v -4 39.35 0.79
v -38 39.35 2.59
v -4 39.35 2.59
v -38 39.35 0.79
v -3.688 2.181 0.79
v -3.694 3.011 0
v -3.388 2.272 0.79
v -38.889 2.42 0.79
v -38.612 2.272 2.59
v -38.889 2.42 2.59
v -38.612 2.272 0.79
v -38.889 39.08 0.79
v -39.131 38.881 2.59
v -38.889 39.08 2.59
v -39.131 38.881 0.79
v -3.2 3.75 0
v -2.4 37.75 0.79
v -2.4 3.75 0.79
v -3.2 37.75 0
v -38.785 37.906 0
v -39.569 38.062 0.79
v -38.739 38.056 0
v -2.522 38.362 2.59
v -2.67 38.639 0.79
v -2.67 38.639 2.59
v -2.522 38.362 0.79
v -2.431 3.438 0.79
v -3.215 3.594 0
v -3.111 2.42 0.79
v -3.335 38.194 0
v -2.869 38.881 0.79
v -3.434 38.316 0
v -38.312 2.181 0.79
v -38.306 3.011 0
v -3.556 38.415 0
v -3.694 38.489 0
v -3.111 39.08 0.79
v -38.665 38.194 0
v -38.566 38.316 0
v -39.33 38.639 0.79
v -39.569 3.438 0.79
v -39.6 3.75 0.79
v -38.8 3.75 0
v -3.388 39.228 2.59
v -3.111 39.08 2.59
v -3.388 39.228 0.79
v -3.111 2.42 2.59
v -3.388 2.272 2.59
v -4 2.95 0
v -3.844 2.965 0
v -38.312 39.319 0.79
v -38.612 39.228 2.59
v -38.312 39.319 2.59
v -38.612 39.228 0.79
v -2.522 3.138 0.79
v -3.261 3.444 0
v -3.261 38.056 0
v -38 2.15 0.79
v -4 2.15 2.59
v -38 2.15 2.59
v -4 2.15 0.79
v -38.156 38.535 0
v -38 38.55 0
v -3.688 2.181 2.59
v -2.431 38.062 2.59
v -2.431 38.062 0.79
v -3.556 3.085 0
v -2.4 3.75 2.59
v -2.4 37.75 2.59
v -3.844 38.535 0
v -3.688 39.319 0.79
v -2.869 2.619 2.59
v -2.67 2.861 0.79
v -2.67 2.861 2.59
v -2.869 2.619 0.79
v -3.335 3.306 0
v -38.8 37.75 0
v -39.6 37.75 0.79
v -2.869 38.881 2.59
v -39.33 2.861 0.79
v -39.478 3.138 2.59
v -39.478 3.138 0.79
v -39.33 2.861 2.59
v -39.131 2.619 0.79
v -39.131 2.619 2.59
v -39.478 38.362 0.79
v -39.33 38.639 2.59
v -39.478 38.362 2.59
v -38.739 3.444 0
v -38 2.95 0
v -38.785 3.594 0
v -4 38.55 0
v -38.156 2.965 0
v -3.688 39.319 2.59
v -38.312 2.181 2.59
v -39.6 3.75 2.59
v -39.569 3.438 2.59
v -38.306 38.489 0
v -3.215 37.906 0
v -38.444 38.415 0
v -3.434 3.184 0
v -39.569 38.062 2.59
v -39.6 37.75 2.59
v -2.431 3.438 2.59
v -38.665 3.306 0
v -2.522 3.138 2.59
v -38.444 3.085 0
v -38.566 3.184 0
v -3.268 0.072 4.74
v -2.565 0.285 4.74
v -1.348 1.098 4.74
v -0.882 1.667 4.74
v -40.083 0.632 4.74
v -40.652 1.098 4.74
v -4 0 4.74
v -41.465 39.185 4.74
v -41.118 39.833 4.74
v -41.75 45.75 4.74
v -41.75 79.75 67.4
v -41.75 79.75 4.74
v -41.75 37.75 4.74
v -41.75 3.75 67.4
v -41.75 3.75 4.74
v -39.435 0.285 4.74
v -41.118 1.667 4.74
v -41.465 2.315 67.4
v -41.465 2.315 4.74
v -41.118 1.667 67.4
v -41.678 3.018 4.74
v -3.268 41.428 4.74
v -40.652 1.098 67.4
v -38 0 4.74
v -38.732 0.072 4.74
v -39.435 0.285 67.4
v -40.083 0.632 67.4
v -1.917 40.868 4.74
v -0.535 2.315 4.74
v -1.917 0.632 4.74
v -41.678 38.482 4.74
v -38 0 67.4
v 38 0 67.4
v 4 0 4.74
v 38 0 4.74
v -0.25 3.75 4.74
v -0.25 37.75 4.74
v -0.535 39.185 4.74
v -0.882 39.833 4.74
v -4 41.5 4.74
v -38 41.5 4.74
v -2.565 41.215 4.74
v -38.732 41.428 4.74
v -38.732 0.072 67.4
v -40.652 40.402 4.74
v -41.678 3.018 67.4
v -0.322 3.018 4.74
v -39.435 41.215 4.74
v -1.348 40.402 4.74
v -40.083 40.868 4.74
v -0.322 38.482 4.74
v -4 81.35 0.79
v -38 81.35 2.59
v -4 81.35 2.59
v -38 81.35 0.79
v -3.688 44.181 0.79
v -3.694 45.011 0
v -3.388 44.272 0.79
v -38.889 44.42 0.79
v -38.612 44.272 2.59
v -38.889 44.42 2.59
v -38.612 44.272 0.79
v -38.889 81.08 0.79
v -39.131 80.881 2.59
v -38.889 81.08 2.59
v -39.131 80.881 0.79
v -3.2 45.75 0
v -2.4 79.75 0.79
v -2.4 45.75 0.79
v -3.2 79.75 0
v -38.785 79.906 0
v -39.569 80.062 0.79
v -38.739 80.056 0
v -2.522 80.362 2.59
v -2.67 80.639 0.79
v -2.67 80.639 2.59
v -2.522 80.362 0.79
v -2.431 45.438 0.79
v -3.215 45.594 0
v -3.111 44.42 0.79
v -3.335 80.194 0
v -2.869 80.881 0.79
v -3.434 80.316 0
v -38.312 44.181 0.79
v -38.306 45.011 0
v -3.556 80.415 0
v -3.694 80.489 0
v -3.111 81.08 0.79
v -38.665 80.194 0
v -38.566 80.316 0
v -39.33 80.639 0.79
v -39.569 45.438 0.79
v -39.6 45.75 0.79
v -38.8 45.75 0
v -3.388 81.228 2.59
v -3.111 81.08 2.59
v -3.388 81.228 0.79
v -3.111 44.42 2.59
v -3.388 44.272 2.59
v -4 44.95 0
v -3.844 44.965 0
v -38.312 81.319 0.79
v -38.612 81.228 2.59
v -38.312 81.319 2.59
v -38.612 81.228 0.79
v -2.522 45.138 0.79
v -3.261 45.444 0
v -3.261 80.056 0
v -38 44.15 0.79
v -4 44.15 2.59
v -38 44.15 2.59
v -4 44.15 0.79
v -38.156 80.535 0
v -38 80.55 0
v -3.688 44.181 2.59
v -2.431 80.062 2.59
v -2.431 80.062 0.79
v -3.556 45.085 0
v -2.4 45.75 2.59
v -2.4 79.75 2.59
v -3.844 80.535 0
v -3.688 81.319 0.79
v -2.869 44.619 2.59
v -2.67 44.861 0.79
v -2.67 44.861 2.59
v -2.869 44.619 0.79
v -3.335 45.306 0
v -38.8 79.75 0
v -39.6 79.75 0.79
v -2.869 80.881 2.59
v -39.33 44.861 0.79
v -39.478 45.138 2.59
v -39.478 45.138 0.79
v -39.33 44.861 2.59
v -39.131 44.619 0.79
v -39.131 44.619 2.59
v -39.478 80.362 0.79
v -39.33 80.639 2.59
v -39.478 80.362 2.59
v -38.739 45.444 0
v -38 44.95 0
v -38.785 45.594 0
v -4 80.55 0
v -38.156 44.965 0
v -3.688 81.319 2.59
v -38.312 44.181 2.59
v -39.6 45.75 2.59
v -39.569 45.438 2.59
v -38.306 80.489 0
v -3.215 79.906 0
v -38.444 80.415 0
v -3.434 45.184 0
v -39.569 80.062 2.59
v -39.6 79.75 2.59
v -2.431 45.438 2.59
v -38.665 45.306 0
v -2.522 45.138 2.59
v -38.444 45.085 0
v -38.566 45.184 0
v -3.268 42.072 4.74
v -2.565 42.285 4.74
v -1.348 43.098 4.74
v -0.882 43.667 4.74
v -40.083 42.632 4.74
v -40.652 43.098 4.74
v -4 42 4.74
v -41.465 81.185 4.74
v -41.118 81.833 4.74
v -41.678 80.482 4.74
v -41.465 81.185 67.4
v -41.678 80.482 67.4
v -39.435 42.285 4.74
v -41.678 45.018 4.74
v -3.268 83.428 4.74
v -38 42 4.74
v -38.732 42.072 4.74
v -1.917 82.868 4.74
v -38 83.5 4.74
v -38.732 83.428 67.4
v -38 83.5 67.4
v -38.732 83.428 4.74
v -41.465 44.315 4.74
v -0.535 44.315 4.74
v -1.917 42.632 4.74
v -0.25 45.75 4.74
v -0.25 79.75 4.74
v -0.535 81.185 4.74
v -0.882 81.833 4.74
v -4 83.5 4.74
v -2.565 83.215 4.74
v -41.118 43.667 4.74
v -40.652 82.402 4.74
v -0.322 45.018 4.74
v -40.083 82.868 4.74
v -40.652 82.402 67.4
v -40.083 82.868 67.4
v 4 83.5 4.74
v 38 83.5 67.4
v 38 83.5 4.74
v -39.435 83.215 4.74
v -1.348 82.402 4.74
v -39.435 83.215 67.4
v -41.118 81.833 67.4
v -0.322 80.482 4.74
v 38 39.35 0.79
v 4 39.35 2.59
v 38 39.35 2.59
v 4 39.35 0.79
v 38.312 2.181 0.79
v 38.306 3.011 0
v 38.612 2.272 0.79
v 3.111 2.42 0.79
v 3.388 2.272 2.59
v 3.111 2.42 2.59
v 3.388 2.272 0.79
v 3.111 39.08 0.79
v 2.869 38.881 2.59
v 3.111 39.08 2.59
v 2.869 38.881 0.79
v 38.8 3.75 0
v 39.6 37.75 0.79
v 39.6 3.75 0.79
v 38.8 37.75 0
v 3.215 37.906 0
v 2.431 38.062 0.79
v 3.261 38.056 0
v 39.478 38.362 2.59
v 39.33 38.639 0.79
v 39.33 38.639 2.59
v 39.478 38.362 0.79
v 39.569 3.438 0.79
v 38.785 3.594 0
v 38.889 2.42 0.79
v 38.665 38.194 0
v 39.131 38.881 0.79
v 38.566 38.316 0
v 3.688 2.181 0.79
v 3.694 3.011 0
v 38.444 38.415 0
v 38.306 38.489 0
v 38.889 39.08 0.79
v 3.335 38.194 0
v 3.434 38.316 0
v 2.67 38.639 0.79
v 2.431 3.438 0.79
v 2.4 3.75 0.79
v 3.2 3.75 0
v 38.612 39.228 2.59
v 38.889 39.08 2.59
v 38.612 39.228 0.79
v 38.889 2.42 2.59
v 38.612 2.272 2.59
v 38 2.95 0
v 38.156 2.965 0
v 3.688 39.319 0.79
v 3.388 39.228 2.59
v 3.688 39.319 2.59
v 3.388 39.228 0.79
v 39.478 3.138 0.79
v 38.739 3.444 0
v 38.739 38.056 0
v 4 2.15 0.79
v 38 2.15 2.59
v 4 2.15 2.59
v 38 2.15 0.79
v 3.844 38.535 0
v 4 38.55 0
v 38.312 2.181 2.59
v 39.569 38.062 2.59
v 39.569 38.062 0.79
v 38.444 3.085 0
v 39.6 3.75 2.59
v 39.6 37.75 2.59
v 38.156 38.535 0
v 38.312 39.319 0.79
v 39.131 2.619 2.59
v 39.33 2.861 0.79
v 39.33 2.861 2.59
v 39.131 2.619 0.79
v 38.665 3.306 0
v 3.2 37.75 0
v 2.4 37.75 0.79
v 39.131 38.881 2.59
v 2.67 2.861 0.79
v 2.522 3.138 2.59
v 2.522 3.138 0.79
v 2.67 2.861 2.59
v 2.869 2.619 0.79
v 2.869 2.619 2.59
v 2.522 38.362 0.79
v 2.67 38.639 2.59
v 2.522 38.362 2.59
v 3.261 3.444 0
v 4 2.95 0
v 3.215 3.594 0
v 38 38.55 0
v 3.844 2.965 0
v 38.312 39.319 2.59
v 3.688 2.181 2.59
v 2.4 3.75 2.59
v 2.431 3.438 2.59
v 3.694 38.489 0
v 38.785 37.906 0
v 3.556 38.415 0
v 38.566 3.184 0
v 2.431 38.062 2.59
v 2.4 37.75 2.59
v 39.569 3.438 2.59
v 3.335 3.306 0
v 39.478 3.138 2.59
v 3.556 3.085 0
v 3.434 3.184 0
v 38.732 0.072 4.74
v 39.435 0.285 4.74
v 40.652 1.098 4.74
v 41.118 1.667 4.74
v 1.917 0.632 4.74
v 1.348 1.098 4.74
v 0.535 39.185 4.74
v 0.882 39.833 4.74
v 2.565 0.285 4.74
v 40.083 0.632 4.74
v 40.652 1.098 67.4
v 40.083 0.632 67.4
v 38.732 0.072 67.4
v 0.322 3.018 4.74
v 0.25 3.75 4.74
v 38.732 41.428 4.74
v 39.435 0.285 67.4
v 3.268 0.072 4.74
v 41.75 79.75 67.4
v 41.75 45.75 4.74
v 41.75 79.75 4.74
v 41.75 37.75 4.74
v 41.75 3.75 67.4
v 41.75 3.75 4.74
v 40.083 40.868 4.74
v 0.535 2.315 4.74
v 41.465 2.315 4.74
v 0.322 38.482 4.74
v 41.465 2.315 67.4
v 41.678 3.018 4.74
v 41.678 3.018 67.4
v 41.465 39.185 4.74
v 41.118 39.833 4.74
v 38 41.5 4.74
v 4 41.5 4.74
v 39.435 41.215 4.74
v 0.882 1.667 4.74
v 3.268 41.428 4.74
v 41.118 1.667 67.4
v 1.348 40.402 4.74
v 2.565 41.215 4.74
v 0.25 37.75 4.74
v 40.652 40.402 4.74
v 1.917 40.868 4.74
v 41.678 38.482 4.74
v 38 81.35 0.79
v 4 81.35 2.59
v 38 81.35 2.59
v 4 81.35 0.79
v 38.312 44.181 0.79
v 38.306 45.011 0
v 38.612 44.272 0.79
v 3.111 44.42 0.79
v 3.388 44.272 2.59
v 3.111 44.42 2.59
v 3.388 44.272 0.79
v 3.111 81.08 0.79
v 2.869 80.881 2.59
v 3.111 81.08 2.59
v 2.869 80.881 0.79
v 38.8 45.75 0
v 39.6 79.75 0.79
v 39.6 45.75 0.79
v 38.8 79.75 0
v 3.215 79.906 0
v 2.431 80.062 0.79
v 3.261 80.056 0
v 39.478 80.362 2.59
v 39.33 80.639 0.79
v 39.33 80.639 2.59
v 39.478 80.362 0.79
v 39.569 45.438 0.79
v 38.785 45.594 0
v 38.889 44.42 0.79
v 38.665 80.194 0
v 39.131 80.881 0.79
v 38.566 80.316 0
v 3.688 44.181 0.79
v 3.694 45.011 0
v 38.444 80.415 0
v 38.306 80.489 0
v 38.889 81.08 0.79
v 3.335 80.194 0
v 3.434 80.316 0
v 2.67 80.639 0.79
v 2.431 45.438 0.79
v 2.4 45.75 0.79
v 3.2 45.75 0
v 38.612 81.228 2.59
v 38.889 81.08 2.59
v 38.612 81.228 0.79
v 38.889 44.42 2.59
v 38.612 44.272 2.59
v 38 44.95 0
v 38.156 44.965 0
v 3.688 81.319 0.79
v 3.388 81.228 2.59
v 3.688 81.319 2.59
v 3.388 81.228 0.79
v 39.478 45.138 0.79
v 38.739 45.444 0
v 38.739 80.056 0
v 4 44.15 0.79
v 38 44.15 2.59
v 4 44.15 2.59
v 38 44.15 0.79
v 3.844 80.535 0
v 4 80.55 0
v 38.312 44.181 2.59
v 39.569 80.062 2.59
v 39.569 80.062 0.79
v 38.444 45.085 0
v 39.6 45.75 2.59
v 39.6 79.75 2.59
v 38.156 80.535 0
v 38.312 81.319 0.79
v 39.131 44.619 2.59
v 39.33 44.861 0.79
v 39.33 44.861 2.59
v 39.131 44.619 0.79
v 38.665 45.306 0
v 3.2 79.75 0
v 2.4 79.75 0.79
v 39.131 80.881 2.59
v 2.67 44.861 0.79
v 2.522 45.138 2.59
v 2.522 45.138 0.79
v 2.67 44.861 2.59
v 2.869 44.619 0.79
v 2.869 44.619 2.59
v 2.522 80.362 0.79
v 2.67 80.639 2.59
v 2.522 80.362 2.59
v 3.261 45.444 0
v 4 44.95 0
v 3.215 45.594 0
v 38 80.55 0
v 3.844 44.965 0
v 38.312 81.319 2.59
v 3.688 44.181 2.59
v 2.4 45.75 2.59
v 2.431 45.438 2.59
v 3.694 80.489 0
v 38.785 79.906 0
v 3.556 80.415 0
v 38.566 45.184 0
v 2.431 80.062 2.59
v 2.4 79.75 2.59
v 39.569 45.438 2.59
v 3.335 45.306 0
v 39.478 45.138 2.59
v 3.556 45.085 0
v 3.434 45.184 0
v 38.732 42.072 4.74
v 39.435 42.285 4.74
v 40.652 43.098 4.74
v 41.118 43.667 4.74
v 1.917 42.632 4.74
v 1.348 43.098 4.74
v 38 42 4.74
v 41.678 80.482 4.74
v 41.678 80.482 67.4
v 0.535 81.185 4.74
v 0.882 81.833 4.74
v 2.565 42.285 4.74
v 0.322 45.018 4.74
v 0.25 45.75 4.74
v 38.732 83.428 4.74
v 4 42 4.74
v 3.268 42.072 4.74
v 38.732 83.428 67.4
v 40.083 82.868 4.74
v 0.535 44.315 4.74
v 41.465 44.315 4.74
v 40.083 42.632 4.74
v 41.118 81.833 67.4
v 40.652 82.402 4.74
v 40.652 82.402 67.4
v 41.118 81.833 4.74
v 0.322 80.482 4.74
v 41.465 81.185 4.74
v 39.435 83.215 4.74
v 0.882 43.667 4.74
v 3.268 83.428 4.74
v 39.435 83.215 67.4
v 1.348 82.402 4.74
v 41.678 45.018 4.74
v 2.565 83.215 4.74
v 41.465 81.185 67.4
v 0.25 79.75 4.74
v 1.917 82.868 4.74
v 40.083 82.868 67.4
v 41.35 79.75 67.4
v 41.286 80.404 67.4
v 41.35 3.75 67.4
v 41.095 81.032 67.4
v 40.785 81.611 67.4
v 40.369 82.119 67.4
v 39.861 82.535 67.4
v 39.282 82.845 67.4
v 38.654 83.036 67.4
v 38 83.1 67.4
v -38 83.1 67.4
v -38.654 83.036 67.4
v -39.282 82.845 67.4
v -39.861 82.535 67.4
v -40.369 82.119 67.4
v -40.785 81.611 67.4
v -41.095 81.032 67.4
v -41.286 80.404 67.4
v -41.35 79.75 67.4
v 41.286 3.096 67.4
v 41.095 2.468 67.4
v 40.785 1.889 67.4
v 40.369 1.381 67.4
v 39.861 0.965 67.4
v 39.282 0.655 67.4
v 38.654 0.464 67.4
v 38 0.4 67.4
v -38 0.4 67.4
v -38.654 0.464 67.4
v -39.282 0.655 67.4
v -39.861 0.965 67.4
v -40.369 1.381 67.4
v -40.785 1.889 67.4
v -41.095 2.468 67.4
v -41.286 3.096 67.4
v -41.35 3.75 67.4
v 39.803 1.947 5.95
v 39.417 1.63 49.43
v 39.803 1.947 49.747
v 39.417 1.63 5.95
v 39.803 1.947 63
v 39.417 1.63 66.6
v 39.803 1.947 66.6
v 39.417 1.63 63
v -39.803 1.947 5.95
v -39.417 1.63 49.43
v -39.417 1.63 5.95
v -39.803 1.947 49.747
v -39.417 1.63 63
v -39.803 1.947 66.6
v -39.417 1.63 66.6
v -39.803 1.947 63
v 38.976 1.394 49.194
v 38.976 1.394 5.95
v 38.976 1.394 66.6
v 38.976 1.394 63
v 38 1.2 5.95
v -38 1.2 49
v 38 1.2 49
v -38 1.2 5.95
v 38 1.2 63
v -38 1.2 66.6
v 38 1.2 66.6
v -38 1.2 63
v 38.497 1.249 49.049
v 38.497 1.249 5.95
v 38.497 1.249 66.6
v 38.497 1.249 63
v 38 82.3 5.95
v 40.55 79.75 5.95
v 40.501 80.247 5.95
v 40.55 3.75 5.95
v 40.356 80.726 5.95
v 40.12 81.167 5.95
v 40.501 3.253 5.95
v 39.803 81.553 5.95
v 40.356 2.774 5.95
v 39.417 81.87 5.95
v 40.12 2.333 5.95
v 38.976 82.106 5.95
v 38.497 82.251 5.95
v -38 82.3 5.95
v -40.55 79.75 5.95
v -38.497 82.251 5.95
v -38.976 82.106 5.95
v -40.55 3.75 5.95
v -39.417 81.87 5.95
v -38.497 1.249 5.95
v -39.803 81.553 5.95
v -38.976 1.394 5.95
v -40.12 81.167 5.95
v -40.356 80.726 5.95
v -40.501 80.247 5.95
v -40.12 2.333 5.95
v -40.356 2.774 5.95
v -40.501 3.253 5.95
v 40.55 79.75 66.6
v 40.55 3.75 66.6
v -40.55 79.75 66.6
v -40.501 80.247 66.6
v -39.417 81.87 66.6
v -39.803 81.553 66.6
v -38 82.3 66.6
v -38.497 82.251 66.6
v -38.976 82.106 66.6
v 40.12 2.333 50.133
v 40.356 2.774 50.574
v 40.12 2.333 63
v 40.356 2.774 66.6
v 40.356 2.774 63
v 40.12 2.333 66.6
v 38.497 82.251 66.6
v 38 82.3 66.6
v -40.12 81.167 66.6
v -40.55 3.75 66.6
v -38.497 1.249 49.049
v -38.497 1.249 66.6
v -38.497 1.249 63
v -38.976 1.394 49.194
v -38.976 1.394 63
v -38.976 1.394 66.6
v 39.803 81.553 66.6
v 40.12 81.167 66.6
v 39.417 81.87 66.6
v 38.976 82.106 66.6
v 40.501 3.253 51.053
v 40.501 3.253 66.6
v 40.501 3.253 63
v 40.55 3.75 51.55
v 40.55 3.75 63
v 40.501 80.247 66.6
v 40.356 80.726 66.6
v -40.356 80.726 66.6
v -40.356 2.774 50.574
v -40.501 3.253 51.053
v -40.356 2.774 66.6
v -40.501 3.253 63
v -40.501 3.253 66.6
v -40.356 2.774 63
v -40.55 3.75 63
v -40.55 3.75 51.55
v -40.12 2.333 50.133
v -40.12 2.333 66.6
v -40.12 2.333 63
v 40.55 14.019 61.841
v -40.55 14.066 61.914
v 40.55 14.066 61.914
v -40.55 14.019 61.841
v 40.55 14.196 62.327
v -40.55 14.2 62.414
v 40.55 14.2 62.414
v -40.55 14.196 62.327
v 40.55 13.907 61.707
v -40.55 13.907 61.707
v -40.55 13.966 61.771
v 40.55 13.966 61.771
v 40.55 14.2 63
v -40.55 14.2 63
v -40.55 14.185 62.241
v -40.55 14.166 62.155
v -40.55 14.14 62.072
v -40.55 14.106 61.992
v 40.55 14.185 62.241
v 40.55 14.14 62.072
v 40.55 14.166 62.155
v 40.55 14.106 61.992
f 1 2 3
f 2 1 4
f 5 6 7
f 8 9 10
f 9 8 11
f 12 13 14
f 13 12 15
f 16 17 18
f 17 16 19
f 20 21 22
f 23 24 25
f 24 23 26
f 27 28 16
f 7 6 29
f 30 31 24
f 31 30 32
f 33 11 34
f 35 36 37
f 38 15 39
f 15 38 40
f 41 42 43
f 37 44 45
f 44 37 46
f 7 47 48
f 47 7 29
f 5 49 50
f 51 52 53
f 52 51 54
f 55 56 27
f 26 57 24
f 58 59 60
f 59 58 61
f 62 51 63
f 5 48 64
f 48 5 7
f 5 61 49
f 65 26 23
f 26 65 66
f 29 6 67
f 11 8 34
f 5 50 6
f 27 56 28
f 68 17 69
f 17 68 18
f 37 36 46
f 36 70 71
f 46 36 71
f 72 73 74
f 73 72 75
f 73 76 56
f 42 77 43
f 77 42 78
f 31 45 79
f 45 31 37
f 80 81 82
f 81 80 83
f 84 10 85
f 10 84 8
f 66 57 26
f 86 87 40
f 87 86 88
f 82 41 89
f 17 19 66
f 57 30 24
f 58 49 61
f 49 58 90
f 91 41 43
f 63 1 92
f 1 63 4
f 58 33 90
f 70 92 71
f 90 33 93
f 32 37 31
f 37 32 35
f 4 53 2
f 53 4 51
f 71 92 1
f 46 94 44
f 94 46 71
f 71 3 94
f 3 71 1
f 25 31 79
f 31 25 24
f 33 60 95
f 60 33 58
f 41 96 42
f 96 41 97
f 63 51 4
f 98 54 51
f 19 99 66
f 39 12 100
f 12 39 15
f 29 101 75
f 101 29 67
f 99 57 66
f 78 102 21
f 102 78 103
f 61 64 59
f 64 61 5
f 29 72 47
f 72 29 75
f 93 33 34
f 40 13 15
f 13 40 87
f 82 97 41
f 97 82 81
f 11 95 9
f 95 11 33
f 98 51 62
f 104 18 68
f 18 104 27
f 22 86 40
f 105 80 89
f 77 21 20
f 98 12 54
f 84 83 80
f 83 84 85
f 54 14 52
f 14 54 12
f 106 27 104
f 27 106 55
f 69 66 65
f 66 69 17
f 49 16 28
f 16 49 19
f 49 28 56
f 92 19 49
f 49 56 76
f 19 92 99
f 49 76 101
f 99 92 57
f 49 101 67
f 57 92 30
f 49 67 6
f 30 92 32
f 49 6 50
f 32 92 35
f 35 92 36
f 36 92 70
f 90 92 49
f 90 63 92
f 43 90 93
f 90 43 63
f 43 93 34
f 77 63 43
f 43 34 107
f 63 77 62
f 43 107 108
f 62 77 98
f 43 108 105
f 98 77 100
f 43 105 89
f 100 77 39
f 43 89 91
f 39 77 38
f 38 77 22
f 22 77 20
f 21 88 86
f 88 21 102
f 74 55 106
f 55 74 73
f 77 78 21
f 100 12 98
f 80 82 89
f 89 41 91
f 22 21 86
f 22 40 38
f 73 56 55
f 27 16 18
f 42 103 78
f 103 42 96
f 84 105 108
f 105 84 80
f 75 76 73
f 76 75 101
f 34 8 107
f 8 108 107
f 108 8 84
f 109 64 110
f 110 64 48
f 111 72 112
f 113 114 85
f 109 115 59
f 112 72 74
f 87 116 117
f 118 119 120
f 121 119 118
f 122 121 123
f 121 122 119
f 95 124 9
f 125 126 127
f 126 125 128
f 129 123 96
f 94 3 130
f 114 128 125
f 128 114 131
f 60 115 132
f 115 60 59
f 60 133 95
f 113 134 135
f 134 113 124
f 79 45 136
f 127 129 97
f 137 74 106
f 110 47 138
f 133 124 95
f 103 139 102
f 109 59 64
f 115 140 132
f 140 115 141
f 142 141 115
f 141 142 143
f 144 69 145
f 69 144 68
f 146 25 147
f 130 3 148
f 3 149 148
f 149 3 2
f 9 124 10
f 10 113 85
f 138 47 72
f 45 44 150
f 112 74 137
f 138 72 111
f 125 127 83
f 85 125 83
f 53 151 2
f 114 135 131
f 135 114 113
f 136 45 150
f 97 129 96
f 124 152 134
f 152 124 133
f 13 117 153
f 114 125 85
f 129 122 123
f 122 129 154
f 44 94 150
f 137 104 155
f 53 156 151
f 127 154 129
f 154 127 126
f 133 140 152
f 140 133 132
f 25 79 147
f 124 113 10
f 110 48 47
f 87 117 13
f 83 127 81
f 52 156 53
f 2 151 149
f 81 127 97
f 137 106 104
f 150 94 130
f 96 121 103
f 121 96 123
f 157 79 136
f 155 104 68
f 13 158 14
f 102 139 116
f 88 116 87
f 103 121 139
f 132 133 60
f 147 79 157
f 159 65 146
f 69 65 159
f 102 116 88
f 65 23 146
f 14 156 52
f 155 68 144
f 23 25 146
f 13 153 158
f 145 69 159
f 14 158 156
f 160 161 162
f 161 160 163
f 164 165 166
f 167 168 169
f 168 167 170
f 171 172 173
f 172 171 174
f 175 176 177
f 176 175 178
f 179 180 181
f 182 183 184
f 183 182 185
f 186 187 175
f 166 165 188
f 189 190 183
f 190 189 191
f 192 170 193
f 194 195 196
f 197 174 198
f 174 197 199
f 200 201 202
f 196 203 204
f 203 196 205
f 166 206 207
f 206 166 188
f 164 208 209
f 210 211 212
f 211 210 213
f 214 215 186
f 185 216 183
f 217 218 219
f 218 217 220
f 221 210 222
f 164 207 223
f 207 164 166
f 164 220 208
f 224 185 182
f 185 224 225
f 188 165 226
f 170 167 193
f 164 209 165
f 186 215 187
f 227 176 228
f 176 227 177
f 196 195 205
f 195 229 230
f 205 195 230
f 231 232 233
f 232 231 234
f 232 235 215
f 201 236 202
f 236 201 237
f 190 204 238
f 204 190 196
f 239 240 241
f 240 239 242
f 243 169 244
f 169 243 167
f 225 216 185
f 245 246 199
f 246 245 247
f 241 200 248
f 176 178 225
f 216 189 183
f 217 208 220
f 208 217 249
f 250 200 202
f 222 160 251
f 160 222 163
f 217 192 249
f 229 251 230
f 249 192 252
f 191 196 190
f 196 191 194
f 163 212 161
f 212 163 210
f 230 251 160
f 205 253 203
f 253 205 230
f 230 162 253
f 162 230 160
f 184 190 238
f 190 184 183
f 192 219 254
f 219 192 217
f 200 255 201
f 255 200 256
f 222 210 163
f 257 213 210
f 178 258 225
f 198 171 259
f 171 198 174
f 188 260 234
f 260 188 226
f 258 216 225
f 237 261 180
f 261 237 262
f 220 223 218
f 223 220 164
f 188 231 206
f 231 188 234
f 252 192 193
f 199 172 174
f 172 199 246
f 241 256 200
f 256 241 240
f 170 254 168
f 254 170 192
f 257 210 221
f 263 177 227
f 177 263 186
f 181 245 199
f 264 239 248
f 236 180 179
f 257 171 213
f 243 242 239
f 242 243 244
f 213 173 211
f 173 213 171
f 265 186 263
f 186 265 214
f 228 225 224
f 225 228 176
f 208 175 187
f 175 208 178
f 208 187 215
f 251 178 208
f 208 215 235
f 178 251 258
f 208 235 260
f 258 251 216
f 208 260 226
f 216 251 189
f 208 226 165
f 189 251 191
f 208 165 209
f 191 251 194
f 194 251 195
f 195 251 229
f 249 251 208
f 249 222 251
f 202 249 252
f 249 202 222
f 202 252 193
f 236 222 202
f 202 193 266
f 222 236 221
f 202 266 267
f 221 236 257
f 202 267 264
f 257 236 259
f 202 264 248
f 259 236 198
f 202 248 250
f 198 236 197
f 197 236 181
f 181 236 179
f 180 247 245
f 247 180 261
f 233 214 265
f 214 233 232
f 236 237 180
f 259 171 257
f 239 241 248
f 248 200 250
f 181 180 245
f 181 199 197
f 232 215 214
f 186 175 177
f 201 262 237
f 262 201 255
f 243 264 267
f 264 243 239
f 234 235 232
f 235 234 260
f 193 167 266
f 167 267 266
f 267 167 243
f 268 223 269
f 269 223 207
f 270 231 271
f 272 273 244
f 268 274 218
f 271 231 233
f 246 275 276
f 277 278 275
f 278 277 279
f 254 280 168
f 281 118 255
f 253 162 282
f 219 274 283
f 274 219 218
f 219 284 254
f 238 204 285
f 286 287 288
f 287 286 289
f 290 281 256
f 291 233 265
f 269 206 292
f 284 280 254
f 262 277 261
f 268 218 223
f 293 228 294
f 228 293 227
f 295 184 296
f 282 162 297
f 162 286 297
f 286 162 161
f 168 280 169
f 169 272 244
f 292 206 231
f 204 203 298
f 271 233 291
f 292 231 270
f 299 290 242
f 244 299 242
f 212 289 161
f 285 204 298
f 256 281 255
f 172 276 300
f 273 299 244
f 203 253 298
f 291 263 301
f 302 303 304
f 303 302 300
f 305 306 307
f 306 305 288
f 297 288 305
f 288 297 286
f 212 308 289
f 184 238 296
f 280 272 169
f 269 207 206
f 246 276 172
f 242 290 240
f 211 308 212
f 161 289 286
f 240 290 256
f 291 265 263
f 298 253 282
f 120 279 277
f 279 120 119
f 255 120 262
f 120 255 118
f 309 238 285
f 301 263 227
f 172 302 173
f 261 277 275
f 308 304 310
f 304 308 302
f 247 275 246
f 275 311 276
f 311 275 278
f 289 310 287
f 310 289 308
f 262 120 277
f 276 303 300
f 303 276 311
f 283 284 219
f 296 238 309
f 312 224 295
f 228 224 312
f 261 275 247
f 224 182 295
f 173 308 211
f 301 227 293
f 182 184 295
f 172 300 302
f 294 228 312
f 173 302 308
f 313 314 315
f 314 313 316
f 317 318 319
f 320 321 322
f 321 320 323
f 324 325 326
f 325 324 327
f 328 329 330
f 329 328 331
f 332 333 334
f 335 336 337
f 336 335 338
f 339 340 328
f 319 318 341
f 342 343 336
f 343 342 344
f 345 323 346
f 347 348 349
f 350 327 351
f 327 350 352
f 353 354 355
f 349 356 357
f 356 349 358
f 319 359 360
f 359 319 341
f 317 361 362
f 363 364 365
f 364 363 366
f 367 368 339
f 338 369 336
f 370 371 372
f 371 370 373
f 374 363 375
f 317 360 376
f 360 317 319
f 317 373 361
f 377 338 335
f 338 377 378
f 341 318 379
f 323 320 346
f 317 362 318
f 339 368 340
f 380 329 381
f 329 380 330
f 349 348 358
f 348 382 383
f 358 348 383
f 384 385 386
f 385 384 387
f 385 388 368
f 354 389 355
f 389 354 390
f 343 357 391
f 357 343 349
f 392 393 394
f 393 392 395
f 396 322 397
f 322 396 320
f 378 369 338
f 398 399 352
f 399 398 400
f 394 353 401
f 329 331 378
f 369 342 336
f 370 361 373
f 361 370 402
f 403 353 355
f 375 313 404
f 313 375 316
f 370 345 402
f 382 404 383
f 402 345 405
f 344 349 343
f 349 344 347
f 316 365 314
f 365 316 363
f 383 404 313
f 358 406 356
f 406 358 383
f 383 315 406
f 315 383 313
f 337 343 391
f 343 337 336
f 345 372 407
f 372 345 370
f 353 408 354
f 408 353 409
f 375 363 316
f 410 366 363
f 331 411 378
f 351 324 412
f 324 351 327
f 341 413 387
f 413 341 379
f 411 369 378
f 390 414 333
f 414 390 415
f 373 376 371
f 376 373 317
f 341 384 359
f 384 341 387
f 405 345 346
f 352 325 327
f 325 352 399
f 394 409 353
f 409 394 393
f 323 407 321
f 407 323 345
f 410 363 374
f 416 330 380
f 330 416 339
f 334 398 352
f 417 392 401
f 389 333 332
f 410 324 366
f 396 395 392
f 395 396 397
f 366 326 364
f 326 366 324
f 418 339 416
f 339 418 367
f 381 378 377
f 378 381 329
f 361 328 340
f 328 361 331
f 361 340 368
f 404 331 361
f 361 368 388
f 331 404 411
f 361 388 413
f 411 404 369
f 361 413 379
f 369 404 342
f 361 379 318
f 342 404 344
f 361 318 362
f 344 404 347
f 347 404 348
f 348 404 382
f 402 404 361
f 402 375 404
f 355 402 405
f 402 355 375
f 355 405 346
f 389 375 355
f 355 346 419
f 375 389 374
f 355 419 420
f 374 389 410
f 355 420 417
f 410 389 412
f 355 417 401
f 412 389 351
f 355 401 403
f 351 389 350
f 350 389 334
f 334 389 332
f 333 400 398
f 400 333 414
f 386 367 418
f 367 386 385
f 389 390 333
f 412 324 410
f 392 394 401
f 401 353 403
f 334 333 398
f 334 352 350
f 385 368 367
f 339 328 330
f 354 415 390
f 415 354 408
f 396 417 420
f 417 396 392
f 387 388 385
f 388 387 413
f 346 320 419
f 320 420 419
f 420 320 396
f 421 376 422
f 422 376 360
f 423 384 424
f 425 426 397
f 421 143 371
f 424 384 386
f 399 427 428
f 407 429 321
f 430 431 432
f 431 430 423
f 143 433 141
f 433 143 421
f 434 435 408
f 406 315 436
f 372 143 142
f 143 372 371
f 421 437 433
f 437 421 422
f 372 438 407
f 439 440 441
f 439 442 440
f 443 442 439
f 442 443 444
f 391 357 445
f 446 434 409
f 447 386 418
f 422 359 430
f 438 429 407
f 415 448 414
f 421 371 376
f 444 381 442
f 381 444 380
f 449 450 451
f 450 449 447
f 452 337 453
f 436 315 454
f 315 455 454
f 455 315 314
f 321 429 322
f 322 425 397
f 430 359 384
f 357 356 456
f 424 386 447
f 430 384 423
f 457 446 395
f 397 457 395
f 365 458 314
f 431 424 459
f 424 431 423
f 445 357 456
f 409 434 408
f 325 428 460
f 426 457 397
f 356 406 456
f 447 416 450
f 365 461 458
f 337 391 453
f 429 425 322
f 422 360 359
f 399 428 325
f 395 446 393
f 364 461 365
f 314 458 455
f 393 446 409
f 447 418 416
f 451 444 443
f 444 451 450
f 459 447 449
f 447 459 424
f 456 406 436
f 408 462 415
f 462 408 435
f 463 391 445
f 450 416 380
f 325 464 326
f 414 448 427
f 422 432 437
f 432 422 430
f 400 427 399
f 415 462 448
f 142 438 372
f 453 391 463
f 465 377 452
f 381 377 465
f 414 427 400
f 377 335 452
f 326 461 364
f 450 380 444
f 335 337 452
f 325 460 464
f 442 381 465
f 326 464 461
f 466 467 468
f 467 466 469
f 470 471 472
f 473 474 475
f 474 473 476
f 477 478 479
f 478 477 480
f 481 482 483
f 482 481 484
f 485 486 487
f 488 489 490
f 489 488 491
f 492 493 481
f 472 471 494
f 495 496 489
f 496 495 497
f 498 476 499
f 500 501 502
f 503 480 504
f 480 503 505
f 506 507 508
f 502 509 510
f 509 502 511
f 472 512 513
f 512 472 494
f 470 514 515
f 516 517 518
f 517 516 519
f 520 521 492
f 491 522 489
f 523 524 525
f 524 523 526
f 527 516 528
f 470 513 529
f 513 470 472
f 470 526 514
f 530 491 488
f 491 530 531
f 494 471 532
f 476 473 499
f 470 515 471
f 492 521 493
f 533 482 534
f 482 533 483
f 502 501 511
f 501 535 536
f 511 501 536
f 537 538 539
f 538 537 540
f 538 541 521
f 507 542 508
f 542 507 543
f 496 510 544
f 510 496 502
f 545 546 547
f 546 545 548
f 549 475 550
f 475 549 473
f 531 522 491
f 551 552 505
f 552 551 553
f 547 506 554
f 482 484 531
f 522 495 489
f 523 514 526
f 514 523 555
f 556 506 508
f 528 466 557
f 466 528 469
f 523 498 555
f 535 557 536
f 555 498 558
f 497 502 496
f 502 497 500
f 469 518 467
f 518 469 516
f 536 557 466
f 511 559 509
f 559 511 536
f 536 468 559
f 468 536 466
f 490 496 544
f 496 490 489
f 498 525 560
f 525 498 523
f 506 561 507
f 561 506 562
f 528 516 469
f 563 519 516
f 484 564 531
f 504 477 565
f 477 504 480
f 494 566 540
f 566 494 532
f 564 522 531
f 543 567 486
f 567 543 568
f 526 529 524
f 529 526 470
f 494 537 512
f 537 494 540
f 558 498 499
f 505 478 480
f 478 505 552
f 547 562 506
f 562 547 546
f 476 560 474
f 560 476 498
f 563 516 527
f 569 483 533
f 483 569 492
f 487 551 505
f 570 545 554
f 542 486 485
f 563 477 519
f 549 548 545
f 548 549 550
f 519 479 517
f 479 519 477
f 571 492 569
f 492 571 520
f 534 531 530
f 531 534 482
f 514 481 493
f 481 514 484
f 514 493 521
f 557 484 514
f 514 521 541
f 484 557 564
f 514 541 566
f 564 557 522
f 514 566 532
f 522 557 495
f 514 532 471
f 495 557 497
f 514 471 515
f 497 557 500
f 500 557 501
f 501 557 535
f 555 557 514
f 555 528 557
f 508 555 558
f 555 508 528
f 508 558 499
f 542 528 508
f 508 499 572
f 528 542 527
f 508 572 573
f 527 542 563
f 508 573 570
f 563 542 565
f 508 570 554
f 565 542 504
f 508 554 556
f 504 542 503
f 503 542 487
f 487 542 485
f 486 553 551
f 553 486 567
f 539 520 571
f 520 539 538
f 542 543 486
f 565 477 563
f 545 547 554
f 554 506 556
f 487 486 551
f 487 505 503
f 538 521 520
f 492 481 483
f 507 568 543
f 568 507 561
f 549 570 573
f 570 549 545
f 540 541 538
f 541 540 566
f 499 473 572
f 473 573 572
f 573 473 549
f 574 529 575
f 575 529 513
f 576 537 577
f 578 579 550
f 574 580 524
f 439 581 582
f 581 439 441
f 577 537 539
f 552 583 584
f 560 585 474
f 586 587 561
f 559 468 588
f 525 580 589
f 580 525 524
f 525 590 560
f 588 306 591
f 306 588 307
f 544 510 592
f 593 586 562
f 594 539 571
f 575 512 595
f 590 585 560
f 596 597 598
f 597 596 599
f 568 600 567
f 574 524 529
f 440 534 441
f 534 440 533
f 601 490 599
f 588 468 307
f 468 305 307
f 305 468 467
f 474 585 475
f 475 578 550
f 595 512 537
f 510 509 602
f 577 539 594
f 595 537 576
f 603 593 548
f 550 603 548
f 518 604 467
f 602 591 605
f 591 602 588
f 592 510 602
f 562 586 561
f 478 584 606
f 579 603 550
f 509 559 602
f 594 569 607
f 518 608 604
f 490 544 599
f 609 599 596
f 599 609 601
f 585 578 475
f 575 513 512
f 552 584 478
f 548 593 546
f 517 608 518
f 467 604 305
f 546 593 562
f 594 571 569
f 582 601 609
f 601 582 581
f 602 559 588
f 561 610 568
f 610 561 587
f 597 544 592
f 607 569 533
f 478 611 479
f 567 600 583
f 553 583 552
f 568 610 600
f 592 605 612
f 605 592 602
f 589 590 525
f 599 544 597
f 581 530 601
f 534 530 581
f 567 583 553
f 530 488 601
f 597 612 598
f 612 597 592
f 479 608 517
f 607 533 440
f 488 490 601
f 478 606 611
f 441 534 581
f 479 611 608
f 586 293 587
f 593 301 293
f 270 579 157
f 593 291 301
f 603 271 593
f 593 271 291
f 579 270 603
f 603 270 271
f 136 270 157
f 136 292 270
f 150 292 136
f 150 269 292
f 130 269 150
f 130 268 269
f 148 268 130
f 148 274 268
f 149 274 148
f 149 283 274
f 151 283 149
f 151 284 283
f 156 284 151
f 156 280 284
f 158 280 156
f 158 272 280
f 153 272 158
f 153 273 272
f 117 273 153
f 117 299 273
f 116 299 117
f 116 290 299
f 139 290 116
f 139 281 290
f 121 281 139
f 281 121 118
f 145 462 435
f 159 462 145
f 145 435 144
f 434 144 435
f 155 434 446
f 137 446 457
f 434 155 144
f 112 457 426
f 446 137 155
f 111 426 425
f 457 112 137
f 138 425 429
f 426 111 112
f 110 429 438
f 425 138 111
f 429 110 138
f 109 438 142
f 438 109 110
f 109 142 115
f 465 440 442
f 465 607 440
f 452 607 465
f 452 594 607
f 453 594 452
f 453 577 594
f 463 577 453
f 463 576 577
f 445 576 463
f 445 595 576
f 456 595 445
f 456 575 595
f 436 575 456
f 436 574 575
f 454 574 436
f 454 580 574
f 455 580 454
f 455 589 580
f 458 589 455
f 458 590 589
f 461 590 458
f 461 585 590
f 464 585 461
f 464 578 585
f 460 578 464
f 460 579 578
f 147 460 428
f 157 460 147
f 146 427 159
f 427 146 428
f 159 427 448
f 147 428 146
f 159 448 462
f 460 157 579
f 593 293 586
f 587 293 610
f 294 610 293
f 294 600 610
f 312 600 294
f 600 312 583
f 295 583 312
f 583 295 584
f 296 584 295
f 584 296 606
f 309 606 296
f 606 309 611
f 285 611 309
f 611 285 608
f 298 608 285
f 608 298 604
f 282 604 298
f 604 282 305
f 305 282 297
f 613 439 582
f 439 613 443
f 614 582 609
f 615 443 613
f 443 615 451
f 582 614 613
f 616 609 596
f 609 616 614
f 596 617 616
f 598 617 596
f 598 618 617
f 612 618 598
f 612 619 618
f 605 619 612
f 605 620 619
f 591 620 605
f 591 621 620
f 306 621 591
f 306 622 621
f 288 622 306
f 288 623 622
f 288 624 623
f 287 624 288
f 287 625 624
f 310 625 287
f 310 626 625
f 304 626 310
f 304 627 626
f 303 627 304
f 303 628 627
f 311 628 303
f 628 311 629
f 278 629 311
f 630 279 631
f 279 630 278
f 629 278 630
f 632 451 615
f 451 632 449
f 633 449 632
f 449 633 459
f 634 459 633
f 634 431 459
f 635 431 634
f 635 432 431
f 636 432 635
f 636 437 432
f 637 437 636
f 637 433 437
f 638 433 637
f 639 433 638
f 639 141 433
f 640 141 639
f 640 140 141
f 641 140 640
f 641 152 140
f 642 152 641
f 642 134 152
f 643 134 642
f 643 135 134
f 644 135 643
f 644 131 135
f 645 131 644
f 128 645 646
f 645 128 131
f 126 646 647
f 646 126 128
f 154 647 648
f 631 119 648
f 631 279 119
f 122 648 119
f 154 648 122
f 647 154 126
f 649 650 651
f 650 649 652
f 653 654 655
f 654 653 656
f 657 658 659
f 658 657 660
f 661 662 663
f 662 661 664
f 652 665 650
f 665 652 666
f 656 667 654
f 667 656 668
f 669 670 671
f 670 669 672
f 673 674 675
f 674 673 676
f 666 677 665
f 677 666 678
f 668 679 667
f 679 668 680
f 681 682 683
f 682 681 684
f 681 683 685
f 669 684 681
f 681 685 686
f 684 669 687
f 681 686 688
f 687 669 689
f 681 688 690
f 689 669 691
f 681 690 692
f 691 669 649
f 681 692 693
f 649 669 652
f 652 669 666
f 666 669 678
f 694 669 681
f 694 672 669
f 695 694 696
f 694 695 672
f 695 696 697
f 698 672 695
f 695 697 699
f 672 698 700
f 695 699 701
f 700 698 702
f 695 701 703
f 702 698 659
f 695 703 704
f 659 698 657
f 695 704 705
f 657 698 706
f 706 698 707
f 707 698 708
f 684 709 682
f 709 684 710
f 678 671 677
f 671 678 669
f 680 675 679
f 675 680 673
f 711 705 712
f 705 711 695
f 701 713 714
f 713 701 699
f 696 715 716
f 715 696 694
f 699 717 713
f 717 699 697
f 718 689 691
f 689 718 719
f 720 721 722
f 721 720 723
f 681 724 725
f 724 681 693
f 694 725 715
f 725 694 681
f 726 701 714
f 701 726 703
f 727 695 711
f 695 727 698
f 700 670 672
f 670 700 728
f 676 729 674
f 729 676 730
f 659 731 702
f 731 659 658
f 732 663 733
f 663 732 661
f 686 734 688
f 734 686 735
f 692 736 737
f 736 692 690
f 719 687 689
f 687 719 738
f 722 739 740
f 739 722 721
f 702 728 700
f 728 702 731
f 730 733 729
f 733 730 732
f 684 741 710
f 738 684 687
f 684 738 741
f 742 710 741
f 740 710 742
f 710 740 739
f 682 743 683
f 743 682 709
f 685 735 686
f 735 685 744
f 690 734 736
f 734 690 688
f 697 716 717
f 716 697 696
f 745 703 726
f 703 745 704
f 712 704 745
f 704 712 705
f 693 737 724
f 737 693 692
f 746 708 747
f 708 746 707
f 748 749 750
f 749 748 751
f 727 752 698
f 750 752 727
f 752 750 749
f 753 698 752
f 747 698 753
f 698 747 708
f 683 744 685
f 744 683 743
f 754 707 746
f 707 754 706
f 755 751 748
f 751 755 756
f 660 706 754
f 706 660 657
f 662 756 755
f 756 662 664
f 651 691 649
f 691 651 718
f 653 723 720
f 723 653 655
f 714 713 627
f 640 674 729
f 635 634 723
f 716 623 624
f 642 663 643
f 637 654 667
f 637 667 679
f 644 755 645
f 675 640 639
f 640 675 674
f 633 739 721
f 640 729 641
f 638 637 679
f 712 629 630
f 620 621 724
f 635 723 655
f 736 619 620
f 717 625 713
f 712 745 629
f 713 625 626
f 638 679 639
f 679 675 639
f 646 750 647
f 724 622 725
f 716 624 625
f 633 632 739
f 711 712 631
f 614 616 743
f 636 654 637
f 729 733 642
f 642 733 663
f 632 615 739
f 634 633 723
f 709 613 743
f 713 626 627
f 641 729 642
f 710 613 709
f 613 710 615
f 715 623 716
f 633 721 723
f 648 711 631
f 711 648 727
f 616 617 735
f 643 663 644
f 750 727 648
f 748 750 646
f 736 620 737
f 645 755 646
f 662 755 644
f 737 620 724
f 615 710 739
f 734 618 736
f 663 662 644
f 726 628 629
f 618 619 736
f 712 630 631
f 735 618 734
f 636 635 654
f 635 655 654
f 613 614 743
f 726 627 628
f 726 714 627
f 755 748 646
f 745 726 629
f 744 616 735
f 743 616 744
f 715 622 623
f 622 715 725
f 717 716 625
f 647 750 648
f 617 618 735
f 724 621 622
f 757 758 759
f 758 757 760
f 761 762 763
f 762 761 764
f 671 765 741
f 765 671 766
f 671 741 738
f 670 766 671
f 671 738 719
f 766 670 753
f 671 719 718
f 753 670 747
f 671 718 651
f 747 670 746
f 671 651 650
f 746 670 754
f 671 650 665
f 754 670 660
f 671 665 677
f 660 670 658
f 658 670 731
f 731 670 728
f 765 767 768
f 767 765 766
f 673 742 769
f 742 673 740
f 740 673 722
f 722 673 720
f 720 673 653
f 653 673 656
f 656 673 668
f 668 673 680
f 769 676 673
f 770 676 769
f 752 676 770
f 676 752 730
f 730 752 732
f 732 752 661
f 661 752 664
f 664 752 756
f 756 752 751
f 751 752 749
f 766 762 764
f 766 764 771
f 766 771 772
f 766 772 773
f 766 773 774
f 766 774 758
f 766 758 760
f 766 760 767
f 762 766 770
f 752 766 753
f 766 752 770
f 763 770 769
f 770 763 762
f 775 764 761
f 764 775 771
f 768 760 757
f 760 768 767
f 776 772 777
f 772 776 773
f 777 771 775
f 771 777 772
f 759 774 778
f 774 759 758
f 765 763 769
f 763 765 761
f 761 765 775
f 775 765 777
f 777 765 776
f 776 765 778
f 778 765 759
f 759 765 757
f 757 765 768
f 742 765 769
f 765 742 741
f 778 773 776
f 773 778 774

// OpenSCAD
// file: ../../../modules/gridfinity.scad
// Gridfinity ベースプレートの共有 module。
// 寸法は Gridfinity 仕様 (Zack Freedman) の baseplate 輪郭に従う:
//   ピッチ 42、ソケット上端開口 41.5 (角 R4)、上から 45° 面取り 2.15 →
//   垂直 1.8 (37.2 角・R1.85) → 45° 面取り 0.7 → 底 35.8 角 (R1.15)。
//   ソケット深さ = 2.15 + 1.8 + 0.7 = 4.65。
//
// 座標系: X が列方向 (中央が 0)、Y が行方向 (板の前端が 0)、Z=0 が板の底面。
// 板の外形は grid とは独立に rim で与えるので、grid より大きい板 (縁付き) を
// 作れる。ソケットは rim=[left, right, front, back] の内側へ 42 ピッチで並ぶ。

gf_pitch = 42;
gf_socket_top = 41.5; // 上端開口
gf_socket_mid = 37.2; // 垂直部
gf_socket_bot = 35.8; // 底
gf_socket_r_top = 4;
gf_socket_r_mid = 1.85;
gf_socket_r_bot = 1.15;
gf_chamfer_top = 2.15;
gf_wall_h = 1.8;
gf_chamfer_bot = 0.7;
gf_socket_depth = gf_chamfer_top + gf_wall_h + gf_chamfer_bot; // 4.65
gf_fn = 32;
gf_eps = 0.01; // hull 用の薄板の厚さ
gf_over = 0.5; // 切削の抜き代

// 角丸正方形または矩形 (w は一辺、または [幅, 奥行き]、角 R)
module
gf_rounded_square(w, r)
{
    offset(r = r, $fn = gf_fn)
        square(is_list(w) ? w - [ 2 * r, 2 * r ] : w - 2 * r, center = true);
}

// 厚さ gf_eps の角丸正方形の薄板を z に置く (hull の骨)
module
gf_slab(w, r, z)
{
    translate([ 0, 0, z ]) linear_extrude(gf_eps) gf_rounded_square(w, r);
}

// ソケット1個の切削体。z=0 がソケットの底 (床の天面)、+Z へ 4.65 で天面に出る。
// clearance は嵌合の逃げで、輪郭を全周へ clearance だけ外へ出す (幅 +2c、角 R
// +c)。pitch_x は X 方向のセル幅。端数でも角 R と面取りの寸法を保つ。
module
gf_socket_cut(clearance = 0, pitch_x = gf_pitch)
{
    z1 = gf_chamfer_bot;
    z2 = z1 + gf_wall_h;
    z3 = gf_socket_depth;
    c = clearance;
    assert(pitch_x > gf_pitch - gf_socket_top + 2 * gf_socket_r_top,
           "Cell width is too small for the socket corner radius");
    delta = [ pitch_x - gf_pitch, 0 ];
    bot = [ gf_socket_bot + 2 * c, gf_socket_bot + 2 * c ] + delta;
    mid = [ gf_socket_mid + 2 * c, gf_socket_mid + 2 * c ] + delta;
    top = [ gf_socket_top + 2 * c, gf_socket_top + 2 * c ] + delta;
    hull()
    {
        gf_slab(bot, gf_socket_r_bot + c, 0);
        gf_slab(mid, gf_socket_r_mid + c, z1 - gf_eps);
    }
    hull()
    {
        gf_slab(mid, gf_socket_r_mid + c, z1 - gf_eps);
        gf_slab(mid, gf_socket_r_mid + c, z2 - gf_eps);
    }
    hull()
    {
        gf_slab(mid, gf_socket_r_mid + c, z2 - gf_eps);
        gf_slab(top, gf_socket_r_top + c, z3 - gf_eps);
    }
    // 天面より上へ抜く (天面と同一平面の退化した面を残さない)
    gf_slab(top, gf_socket_r_top + c, z3 - gf_eps);
    translate([ 0, 0, z3 - gf_eps ]) linear_extrude(gf_over + gf_eps)
        gf_rounded_square(top, gf_socket_r_top + c);
}

// ベースプレート。cols x rows のソケットを床 floor_t の上に彫る。
// rim = [left, right, front, back] はソケット列の外側に残す縁の幅。
// 板の幅 = cols*42 + left + right、奥行き = rows*42 + front + back。
// cols の端数は左端の細幅セルになる。rows は正の整数。
// clearance はソケットの嵌合の逃げ (gf_socket_cut を参照)。
module
gf_baseplate(cols, rows, rim = [ 0, 0, 0, 0 ], floor_t = 1, clearance = 0)
{
    grid_w = cols * gf_pitch;
    grid_d = rows * gf_pitch;
    plate_w = grid_w + rim[0] + rim[1];
    plate_d = grid_d + rim[2] + rim[3];
    x0 = -plate_w / 2 + rim[0]; // ソケット列の左端
    first_pitch = grid_w - (ceil(cols) - 1) * gf_pitch;
    difference()
    {
        translate([ -plate_w / 2, 0, 0 ])
            cube([ plate_w, plate_d, floor_t + gf_socket_depth ]);
        for (c = [0:ceil(cols) - 1], r = [0:rows - 1])
            translate([
                x0 + (c == 0 ? first_pitch / 2
                             : first_pitch + (c - 0.5) * gf_pitch),
                rim[2] + (r + 0.5) * gf_pitch,
                floor_t
            ]) gf_socket_cut(clearance, c == 0 ? first_pitch : gf_pitch);
    }
}
// file: ../../../modules/gridfinity_bins.scad
include <gridfinity_bin.scad>

// assets/gridfinity-bin/ の bin 群の共通値と、サイズ 3 引数の払い出し口。
// 単体では何も描かない。設計の経緯と確定値は
// ledger/designs/gridfinity-bin-4u.md が正本。
// 通常binは4U/9U、X={1,1.5,2,2.5,3} × Y={1,2,3,4,5,5.5}。
// 両軸に端数を持つ組み合わせはassetに置かない（各高さ28種）。
// Xが横、Yがラベルの壁から奥、unitsが高さ（7mm単位）。
wall = 1.2;    // 0.4 ノズル 3 本
floor_t = 1.2; // 底 (4.75) の上に載せる床。床の天面 z = 5.95
label_d = 13;  // 12mm 幅のラベルシールを貼る天板の張り出し
label_t = 1; // 天板の厚さ (user 指定)。下は 45° の無垢のくさび
label_r = 1; // 天板の先端と 45° 面の境目の R (user 指定)
// カードケース (goods/card_case_2x3x4u.scad) の値。カードは ISO/IEC 7810 ID-1 (85.6 × 54 ×
// 0.76、隅 R3) で、長辺を Y (rows 方向) に寝かせ、X 中央・手前の壁から 10 奥に置く。ポケットは
// カードより 1 大きい (片側 0.5)。右奥のマスは壁の内面まで抜き、床と底を外形に平行な 45° の窪みにする。
// ポケットの左右の埋めの天面 (幅 13.05) が 12mm のラベルを貼る帯。ポケットと穴の交点の
// 縦エッジは丸める (開口の上縁は丸めない: 壁を上端まで垂直に保ち、収まる枚数を減らさない)
card_w = 54;    // カードの短辺 (X)。user 指定「高さ 54」
card_d = 85.6;  // カードの長辺 (Y)。user 指定「幅 85.6」
card_clear = 1; // ポケットの余裕 (user 指定「+1mm」)
// ポケットの手前の辺の、手前の壁の内面からの距離 (user 指定「10mm」)
card_off = 10;
// ポケットの平面の隅 R (user 指定「角の丸み 3mm」。ID-1 の隅は 2.88..3.48)
card_r = 3;
// ポケットと穴が交わる所の、埋めの凸の縦エッジの R (指の当たる角)
card_edge_r = 2;
recess_skin = floor_t + 1.75; // 窪みの床 z (底の皮)。user 指定「壁厚と同じ 1.2 は過剰、1.75 返す」

function bin_contract(cols, rows, units) = str("CONTRACT units=",
                                               units,
                                               " pitch=",
                                               gf_pitch,
                                               " outer=",
                                               gfb_outer,
                                               " h=",
                                               units* gfb_unit,
                                               " lip=",
                                               gfb_lip_h,
                                               " base=",
                                               gfb_base_bot,
                                               "/",
                                               gfb_base_mid,
                                               "/",
                                               gfb_outer,
                                               " base_h=",
                                               gfb_base_h,
                                               " wall=",
                                               wall,
                                               " floor_top=",
                                               gfb_base_h + floor_t,
                                               " label=",
                                               label_d,
                                               "x",
                                               label_t,
                                               " wedge=45 fillet=",
                                               label_r,
                                               " bin=",
                                               cols,
                                               "x",
                                               rows,
                                               " size=",
                                               cols* gf_pitch - 0.5,
                                               "x",
                                               rows* gf_pitch - 0.5);

// (cols, rows, units) でラベル付き bin を払い出す。例: gridfinity_bin(2, 4, 4)
module
gridfinity_bin(cols, rows, units = 4)
{
    echo(bin_contract(cols, rows, units));
    gfb_bin(cols, rows, units, wall, floor_t, label_d, label_t, label_r);
}

function card_contract(cols, rows, units) = str("CONTRACT card units=",
                                                units,
                                                " bin=",
                                                cols,
                                                "x",
                                                rows,
                                                " size=",
                                                cols* gf_pitch - 0.5,
                                                "x",
                                                rows* gf_pitch - 0.5,
                                                " h=",
                                                units* gfb_unit,
                                                " lip=",
                                                gfb_lip_h,
                                                " floor_top=",
                                                gfb_base_h + floor_t,
                                                " card=",
                                                card_w,
                                                "x",
                                                card_d,
                                                " pocket=",
                                                card_w + card_clear,
                                                "x",
                                                card_d + card_clear,
                                                " at=",
                                                -(card_w + card_clear) / 2,
                                                ",",
                                                wall + card_off,
                                                " hole=",
                                                (cols - 1) / 2 * gf_pitch - gfb_outer / 2,
                                                ",",
                                                (rows - 0.5) * gf_pitch - 0.25 - gfb_outer / 2,
                                                " hole_r=",
                                                gfb_outer_r - wall,
                                                " recess=",
                                                gfb_outer - 2 * wall,
                                                "/",
                                                gfb_base_mid - 2 * wall,
                                                " recess_floor=",
                                                recess_skin,
                                                " r=",
                                                card_r,
                                                " edge_r=",
                                                card_edge_r);

// (cols, rows, units) でカードケースを払い出す。例: gridfinity_card_case(2, 3, 4)
module
gridfinity_card_case(cols, rows, units = 4)
{
    echo(card_contract(cols, rows, units));
    gfb_card_case(cols,
                  rows,
                  units,
                  wall,
                  floor_t,
                  [ card_w, card_d ],
                  card_clear,
                  card_off,
                  card_r,
                  recess_skin,
                  card_edge_r);
}
// main file
include <../../../modules/gridfinity_bins.scad>

gridfinity_bin(2, 2, 9);
